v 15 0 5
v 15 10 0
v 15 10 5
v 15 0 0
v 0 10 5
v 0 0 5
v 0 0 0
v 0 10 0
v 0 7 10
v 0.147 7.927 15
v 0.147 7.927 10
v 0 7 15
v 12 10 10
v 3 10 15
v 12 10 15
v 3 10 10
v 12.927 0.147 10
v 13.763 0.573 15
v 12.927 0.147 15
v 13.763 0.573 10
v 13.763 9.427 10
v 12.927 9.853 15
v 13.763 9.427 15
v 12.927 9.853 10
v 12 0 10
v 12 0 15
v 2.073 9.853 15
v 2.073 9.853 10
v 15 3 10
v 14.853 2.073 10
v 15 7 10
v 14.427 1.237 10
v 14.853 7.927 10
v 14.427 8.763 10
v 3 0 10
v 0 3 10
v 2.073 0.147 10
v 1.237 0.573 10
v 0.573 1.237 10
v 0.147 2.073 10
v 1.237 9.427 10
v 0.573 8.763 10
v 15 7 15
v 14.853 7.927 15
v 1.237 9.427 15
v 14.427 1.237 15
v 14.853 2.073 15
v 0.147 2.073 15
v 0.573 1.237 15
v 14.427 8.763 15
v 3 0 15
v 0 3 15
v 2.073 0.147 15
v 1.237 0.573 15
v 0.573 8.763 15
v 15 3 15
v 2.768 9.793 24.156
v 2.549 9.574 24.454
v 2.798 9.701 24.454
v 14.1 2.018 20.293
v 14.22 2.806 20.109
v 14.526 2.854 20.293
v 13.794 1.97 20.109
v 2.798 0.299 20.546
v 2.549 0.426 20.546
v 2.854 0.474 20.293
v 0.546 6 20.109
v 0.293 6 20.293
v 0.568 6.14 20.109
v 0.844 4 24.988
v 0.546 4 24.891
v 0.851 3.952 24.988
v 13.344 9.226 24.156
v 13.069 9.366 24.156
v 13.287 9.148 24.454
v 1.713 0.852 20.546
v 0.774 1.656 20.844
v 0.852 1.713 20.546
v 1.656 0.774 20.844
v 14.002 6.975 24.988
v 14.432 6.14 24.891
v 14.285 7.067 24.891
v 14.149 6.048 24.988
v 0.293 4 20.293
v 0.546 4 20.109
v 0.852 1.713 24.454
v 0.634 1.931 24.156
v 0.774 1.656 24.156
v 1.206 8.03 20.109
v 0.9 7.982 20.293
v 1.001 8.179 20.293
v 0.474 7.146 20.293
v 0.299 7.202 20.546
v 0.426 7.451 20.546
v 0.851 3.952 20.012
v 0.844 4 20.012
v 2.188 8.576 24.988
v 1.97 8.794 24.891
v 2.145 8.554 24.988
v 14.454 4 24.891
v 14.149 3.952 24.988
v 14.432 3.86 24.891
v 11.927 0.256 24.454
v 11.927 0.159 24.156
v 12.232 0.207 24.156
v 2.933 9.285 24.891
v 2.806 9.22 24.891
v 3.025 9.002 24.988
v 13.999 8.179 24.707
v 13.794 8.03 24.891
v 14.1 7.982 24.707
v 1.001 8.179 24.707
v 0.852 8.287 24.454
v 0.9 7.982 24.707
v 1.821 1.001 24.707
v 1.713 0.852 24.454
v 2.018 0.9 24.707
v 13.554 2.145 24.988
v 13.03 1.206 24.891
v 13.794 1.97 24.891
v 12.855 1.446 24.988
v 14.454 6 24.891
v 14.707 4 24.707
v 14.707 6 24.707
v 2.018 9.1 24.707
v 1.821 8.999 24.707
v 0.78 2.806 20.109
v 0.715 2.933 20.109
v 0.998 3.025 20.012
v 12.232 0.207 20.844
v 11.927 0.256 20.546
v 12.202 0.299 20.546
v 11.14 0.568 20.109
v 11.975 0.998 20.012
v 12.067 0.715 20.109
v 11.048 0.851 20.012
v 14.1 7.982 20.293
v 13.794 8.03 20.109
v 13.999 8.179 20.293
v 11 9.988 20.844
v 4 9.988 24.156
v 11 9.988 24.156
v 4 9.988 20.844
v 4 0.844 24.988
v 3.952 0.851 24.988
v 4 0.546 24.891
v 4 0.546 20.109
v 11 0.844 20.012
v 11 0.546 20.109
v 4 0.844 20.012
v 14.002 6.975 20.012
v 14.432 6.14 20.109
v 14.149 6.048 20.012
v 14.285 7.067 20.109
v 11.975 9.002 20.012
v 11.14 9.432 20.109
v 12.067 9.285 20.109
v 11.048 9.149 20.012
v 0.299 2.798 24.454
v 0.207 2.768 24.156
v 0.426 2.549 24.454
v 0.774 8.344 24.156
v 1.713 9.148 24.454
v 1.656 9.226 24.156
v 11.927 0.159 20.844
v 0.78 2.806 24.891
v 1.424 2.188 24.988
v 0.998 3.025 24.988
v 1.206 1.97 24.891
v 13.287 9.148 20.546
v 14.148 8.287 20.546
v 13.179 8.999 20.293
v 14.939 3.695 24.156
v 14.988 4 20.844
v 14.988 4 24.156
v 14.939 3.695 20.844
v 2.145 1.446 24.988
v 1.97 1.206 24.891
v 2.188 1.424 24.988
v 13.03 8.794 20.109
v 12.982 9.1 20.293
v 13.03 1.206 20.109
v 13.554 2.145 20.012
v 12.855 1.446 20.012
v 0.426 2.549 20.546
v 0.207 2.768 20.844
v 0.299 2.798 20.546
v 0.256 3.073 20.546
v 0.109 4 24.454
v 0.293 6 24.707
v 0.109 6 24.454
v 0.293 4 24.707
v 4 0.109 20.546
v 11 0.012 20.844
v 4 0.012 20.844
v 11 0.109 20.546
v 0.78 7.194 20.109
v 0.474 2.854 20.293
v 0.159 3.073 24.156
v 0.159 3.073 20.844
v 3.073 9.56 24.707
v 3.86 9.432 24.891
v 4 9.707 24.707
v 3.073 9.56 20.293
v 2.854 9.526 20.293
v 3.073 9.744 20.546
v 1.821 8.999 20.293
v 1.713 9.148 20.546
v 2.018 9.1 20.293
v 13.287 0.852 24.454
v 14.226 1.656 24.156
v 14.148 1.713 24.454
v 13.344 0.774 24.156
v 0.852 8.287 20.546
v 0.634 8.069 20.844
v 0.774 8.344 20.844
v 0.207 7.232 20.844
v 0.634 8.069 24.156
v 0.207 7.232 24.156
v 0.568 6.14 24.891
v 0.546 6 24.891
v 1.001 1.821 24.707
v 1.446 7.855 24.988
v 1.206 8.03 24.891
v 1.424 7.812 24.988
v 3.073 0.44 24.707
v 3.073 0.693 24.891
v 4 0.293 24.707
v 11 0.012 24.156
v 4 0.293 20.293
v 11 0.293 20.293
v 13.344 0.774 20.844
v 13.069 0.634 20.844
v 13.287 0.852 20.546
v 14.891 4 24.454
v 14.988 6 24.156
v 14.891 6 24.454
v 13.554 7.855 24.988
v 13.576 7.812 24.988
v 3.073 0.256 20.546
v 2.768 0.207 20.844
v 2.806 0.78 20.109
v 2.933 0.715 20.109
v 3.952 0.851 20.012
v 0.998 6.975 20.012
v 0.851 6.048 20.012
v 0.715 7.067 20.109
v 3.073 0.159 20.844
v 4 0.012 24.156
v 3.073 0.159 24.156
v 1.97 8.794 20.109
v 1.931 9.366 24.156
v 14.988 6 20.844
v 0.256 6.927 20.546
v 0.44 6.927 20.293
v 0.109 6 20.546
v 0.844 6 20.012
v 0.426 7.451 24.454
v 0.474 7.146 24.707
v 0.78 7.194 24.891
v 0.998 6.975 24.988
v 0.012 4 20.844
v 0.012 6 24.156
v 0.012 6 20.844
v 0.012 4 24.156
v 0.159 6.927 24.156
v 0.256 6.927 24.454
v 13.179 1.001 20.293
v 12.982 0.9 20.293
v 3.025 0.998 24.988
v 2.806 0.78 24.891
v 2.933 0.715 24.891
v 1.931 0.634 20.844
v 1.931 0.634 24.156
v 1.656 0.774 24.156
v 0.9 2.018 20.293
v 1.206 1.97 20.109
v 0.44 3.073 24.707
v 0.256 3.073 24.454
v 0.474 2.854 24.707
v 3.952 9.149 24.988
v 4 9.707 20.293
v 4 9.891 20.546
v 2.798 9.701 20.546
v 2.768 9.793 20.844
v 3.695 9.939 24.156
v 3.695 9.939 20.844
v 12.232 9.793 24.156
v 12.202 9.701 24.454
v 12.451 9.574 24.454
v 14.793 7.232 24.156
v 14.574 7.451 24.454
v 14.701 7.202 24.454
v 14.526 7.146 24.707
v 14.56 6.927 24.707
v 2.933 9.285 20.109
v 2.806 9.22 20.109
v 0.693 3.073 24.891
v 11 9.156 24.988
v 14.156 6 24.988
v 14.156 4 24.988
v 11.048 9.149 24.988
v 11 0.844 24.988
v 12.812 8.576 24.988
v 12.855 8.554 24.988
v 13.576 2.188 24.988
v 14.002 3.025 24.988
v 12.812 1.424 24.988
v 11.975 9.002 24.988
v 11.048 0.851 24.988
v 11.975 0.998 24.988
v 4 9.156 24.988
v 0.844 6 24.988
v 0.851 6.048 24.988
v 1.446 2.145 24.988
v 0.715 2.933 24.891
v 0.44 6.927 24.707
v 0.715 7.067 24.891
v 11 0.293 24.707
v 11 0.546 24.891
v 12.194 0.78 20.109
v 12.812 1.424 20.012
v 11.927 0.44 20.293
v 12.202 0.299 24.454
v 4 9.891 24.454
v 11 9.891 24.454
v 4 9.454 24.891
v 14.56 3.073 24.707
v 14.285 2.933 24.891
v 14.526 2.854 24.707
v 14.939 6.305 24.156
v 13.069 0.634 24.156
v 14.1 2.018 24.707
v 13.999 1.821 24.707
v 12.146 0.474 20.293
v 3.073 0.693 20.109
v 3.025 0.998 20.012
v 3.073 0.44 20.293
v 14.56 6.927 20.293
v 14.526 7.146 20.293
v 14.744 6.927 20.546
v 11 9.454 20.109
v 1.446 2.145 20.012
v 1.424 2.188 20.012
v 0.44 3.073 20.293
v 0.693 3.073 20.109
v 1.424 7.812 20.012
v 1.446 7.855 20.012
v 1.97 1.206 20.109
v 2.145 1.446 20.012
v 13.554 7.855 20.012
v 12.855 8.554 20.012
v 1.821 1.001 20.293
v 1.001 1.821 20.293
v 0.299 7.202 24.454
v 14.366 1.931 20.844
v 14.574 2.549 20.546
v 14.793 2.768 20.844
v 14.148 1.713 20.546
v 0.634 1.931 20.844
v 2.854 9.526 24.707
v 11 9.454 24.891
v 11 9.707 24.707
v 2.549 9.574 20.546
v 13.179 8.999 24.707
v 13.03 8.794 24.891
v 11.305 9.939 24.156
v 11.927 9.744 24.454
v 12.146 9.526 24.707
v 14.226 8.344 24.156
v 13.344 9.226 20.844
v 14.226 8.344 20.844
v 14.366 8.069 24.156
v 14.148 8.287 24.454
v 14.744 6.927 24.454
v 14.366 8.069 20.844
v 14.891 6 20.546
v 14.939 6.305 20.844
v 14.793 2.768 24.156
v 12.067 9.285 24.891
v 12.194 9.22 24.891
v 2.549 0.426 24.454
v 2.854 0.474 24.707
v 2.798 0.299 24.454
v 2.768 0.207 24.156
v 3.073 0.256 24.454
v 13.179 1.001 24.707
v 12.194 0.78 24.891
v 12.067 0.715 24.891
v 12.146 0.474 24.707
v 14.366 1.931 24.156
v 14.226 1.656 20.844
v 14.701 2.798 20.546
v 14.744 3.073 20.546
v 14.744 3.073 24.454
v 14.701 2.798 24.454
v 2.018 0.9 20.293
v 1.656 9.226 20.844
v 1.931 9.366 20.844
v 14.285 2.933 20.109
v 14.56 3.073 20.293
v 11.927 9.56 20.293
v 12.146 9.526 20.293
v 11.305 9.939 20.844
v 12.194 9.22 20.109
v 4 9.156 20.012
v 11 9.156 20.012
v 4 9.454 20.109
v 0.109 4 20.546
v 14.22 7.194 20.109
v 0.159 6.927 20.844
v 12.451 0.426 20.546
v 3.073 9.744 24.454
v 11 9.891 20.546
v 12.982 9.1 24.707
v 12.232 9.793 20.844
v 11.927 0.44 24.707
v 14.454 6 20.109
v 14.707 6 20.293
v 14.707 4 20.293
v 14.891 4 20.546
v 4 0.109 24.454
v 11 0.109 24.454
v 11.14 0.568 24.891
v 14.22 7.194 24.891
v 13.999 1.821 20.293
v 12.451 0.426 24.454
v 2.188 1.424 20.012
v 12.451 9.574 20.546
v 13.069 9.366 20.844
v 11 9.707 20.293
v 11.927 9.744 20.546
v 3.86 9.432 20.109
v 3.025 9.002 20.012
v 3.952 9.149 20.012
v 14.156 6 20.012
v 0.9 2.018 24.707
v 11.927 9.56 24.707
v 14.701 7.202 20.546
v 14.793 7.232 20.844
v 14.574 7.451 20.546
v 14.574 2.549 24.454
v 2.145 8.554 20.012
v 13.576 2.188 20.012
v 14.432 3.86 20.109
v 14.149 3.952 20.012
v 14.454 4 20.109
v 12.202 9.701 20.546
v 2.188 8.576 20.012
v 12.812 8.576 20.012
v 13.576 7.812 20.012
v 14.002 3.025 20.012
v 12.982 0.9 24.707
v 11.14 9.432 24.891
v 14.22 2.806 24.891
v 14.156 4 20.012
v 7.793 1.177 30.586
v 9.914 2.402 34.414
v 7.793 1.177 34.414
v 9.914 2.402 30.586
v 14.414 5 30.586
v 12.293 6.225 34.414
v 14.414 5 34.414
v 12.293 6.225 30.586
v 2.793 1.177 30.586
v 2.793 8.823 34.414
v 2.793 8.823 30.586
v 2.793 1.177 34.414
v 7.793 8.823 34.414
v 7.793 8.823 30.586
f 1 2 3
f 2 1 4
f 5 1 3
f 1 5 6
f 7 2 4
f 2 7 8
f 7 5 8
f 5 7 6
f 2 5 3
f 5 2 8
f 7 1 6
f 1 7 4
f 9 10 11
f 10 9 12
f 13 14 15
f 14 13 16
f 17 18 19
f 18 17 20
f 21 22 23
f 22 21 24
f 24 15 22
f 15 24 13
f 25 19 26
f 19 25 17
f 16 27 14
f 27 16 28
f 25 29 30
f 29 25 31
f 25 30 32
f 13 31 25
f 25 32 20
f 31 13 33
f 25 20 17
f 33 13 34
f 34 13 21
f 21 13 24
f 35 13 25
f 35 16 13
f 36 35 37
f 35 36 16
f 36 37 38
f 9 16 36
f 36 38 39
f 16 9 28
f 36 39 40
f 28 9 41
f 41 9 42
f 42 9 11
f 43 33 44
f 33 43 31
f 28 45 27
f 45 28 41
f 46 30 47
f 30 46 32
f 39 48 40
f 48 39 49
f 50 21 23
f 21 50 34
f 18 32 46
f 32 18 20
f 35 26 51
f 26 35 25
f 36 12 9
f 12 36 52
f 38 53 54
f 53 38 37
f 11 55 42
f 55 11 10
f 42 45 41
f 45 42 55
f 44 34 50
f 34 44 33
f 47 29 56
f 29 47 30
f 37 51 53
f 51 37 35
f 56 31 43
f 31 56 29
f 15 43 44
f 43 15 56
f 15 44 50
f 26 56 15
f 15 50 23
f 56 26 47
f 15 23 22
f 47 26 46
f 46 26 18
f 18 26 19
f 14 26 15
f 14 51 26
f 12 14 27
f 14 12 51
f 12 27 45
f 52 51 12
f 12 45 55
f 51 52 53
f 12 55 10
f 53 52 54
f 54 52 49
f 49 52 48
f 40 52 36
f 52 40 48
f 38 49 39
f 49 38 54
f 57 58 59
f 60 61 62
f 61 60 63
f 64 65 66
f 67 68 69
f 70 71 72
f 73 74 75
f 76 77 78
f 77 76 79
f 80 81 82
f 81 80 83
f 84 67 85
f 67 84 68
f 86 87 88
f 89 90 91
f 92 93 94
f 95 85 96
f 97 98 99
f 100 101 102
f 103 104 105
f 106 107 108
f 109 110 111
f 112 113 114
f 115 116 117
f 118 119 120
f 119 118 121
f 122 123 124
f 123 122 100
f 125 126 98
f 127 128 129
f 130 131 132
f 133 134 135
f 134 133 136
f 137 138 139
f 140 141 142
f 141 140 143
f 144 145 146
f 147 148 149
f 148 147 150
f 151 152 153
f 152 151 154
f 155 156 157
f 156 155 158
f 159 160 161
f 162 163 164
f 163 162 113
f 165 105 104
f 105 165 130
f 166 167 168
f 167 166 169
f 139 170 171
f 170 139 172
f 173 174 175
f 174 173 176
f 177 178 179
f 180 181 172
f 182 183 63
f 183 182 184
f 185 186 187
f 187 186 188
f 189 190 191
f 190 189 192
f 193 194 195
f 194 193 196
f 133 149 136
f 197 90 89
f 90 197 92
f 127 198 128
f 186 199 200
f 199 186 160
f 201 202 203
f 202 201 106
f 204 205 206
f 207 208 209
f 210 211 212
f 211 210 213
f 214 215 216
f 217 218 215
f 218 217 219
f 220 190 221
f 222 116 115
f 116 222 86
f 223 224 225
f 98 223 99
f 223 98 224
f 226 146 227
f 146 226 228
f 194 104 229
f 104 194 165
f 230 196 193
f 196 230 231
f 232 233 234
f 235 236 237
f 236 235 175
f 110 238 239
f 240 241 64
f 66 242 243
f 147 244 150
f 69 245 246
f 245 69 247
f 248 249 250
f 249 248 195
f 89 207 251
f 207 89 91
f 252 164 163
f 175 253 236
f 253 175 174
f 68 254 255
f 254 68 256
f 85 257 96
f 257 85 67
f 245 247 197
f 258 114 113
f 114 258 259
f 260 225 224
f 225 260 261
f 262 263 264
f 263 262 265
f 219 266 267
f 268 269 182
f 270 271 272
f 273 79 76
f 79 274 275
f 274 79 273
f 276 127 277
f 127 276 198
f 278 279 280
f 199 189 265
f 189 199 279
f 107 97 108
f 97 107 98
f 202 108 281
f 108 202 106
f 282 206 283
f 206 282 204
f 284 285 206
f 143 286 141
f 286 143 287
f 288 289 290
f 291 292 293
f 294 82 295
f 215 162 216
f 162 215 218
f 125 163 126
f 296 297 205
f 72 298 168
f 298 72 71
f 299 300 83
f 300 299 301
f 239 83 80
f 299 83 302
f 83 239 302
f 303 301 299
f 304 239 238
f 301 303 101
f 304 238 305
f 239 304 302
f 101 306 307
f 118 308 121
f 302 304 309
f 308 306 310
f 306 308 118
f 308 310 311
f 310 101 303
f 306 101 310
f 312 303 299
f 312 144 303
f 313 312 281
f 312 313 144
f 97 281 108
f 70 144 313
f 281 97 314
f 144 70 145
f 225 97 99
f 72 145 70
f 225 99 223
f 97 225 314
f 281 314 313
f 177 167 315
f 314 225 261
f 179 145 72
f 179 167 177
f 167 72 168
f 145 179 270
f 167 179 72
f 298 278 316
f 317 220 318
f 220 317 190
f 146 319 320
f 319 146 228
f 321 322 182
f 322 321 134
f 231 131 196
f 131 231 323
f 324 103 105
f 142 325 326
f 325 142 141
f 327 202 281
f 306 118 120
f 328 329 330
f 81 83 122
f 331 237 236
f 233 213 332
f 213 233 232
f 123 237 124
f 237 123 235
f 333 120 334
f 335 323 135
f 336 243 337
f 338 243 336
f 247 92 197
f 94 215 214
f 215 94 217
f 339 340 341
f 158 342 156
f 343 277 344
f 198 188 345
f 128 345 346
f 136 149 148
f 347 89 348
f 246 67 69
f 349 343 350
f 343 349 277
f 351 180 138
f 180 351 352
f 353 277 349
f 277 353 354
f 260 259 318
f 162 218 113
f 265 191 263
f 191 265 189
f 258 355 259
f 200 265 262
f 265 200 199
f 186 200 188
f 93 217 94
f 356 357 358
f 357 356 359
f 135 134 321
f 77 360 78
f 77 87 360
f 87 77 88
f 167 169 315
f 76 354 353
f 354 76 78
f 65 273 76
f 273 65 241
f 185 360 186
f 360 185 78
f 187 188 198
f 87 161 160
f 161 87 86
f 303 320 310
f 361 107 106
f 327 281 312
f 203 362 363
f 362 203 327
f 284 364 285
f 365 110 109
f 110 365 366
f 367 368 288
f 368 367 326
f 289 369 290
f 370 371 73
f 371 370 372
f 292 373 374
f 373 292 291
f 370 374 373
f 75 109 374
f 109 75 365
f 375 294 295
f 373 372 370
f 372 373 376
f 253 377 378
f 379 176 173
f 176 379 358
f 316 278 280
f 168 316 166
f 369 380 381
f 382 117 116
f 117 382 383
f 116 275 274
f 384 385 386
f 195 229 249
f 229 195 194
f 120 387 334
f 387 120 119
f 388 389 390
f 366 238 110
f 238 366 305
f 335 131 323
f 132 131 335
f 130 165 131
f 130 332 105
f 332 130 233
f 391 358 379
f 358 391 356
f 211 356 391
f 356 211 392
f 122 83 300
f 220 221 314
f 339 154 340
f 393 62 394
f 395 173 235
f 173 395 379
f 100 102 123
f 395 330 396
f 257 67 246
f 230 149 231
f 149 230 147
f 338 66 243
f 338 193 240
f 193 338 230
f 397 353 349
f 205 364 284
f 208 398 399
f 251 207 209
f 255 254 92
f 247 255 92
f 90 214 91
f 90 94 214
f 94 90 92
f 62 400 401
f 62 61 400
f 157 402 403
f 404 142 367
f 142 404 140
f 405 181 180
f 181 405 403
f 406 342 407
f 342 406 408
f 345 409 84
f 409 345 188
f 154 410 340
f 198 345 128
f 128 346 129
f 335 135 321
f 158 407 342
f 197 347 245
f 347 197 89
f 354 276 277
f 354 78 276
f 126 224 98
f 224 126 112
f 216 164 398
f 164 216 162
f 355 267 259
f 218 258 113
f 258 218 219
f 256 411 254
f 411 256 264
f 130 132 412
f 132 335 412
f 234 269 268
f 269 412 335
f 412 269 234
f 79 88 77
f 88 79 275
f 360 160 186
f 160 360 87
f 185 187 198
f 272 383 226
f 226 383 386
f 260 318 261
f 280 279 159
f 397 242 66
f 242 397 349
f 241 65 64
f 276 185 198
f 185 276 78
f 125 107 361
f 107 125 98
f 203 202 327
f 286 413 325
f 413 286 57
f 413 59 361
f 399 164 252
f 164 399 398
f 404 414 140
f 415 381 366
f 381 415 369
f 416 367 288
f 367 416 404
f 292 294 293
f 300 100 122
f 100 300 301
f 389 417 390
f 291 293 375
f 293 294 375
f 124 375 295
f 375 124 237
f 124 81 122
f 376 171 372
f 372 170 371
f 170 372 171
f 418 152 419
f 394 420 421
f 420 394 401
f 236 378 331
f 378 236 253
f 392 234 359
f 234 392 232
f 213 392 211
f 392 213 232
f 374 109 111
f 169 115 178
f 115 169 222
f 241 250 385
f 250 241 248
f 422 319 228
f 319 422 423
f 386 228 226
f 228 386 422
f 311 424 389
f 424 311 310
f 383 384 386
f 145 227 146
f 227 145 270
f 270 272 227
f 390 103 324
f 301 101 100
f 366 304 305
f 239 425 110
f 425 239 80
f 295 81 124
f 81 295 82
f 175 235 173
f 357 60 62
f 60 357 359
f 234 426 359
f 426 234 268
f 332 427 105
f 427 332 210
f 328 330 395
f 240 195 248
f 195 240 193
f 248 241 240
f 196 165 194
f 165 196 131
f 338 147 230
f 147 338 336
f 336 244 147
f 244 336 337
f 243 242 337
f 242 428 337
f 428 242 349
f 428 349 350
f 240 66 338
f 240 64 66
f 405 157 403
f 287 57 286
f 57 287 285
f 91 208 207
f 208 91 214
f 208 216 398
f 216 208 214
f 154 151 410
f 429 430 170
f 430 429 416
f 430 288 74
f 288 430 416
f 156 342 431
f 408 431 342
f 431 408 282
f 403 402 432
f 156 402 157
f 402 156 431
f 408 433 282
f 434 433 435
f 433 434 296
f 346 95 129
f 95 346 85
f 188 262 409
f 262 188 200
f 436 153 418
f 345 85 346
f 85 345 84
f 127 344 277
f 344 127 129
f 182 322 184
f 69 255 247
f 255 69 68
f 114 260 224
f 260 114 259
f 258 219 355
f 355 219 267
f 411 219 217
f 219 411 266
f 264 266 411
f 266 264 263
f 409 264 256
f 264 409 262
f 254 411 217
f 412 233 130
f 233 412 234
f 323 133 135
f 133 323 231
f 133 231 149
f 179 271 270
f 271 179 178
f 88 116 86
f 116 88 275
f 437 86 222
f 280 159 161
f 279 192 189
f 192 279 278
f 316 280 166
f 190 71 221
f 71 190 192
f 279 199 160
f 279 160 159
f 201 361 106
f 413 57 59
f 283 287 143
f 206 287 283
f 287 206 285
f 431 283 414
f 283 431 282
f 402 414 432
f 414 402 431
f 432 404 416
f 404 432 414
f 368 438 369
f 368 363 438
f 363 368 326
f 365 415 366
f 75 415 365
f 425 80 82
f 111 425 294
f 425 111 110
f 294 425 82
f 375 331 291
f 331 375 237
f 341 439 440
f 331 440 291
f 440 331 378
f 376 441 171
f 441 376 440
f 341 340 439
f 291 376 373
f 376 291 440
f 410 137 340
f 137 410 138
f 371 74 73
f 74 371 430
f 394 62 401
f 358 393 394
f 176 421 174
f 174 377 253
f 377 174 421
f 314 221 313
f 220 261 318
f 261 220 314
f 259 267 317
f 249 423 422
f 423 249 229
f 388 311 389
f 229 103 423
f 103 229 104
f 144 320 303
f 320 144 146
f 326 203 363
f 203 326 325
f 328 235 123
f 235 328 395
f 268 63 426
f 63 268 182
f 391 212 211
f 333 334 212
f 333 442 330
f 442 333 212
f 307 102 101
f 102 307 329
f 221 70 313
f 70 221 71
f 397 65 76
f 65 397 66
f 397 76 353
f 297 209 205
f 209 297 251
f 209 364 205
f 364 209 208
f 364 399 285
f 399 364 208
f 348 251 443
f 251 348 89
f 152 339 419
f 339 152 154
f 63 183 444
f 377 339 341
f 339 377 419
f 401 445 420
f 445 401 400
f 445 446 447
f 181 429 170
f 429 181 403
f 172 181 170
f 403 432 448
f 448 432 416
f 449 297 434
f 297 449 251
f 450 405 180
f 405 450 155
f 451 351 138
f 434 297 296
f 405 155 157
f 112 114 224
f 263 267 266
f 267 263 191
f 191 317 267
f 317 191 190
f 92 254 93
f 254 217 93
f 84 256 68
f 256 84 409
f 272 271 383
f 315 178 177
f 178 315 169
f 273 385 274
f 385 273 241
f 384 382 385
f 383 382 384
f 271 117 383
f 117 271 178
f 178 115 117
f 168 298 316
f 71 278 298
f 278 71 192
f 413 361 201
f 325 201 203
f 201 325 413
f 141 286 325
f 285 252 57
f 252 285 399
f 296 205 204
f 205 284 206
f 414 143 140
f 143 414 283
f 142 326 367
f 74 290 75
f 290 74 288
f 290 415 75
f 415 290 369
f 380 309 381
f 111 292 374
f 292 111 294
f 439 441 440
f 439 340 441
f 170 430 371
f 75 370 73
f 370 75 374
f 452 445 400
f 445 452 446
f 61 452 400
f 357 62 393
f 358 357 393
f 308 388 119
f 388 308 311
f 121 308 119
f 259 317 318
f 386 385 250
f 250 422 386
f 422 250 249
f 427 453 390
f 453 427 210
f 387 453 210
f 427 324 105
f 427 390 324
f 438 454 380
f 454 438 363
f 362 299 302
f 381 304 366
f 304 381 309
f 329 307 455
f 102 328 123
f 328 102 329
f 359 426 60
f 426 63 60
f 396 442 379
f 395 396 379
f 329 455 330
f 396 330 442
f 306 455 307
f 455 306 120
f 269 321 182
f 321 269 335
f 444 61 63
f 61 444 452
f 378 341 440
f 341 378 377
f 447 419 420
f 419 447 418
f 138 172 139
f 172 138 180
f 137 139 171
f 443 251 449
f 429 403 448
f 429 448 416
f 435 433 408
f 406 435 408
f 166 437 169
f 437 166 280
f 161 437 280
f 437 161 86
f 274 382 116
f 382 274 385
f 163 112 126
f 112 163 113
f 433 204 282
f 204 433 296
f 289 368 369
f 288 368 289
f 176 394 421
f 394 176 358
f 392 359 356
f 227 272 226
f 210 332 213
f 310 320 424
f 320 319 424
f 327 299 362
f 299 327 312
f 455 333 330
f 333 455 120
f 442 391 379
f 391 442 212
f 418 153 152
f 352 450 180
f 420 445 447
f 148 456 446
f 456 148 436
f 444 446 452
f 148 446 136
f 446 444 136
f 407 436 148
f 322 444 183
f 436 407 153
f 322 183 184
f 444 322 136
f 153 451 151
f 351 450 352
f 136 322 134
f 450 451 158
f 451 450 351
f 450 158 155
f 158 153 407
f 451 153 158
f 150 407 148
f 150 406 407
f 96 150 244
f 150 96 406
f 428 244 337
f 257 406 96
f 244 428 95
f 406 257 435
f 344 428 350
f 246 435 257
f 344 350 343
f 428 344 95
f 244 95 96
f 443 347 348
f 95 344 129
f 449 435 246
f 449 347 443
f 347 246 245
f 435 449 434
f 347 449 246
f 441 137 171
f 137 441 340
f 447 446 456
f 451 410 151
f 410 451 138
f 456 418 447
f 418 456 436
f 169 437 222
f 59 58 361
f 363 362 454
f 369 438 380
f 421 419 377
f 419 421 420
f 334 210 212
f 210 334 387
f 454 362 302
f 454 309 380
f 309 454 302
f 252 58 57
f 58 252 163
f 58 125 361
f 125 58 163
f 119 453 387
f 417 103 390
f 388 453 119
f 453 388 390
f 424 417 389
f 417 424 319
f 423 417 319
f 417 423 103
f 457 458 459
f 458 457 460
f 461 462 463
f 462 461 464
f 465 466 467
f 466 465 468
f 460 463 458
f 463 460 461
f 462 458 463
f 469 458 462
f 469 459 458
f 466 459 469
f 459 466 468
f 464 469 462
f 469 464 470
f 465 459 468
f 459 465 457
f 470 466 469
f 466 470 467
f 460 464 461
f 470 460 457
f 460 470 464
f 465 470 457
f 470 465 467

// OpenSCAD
include <BOSL2/std.scad>
include <BOSL2/hinges.scad>
include <../utils/box.scad>
use <davel/davel.scad>

$fn=96;
module roundcube(inner_x=90, inner_y=60, inner_z=30, wall=3) {
    hull() {
        translate([wall, wall, wall]) sphere(wall); 
        translate([inner_x+wall, wall, wall]) sphere(wall); 
        translate([wall, inner_y+wall, wall]) sphere(wall); 
        translate([inner_x+wall, inner_y+wall, wall]) sphere(wall); 
        translate([wall, wall, inner_z+wall]) sphere(wall); 
        translate([inner_x+wall, wall, inner_z+wall]) sphere(wall); 
        translate([wall, inner_y+wall, inner_z+wall]) sphere(wall); 
        translate([inner_x+wall, inner_y+wall, inner_z+wall]) sphere(wall); 
    }
}

module halfbox(inner_x=90, inner_y=60,  inner_z=30, wall=3) {
    difference() {
        roundcube(inner_x, inner_y, inner_z, wall);
        translate([0, 0, inner_z+wall]) cube([inner_x+2*wall, inner_y+2*wall, wall]);
        translate([wall, wall, wall]) cube([inner_x, inner_y, inner_z+1]);
    }
}

module tbevel(lx, ry, rz) {
    rotate([0, 0, 180])
    translate([-lx/2, 0, 0])
    rotate([0, 90, 0])
    linear_extrude(lx)
    polygon([
        [0, 0],
        [rz, 0],
        [0, ry]
    ]);
}


module mitered_bevel_butress(x, y, ry, rz, cr=0, cro=[0, 0, 0]) { // x, y are inner
    // bottom
    translate([0, -y/2, 0]) rotate([0, 0, 0])  tbevel(x, ry, rz);
    // top
    translate([0, y/2, 0]) rotate([0, 0, 180]) tbevel(x, ry, rz);
    // left
    translate([-x/2, 0, 0]) rotate([0, 0, 270]) tbevel(y, ry, rz);
    // right
    translate([x/2, 0, 0]) rotate([0, 0, 90]) tbevel(y, ry, rz);

    // bl
    translate([-x/2, -y/2, 0])
        intersection() {
            rotate([0, 0, 0]) tbevel(2*ry, ry, rz);
            rotate([0, 0, 270]) tbevel(2*ry, ry, rz);
            if(cr > 0) {
                translate([-cro[0], -cro[1], 0]) 
                rotate([0, 0, 90])
                union() {
                    translate([0, 0, -rz]) cylinder(h=rz, r=cr);
                    translate([0, 0, -rz]) cube([cr, cr, rz]);
                    translate([-cr, -cr, -rz]) cube([cr, cr, rz]);
                }
            }
        }
    //br
    translate([x/2, -y/2, 0])
        intersection() {
            rotate([0, 0, 0]) tbevel(2*ry, ry, rz);
            rotate([0, 0, 90]) tbevel(2*ry, ry, rz);
            if(cr > 0) {
                translate([cro[0], -cro[1], 0]) 
                union() {
                    translate([0, 0, -rz]) cylinder(h=rz, r=cr);
                    translate([0, 0, -rz]) cube([cr, cr, rz]);
                    translate([-cr, -cr, -rz]) cube([cr, cr, rz]);
                }
            }
        }
    // tl
    translate([-x/2, y/2, 0])
        intersection() {
            rotate([0, 0, 180]) tbevel(2*ry, ry, rz);
            rotate([0, 0, 270]) tbevel(2*ry, ry, rz);
            if(cr > 0) {
                translate([-cro[0], cro[1], 0]) 
                union() {
                    translate([0, 0, -rz]) cylinder(h=rz, r=cr);
                    translate([0, 0, -rz]) cube([cr, cr, rz]);
                    translate([-cr, -cr, -rz]) cube([cr, cr, rz]);
                }
            }
        }
    //tr
    translate([x/2, y/2, 0])
        intersection() {
            rotate([0, 0, 180]) tbevel(2*ry, ry, rz);
            rotate([0, 0, 90]) tbevel(2*ry, ry, rz);
            if(cr > 0) {
                translate([cro[0], cro[1], 0]) 
                rotate([0, 0, 90])
                union() {
                    translate([0, 0, -rz]) cylinder(h=rz, r=cr);
                    translate([0, 0, -rz]) cube([cr, cr, rz]);
                    translate([-cr, -cr, -rz]) cube([cr, cr, rz]);
                }
            }
        }
}

module mitered_buttress(x, y, r) { // x, y are inner
    // bottom
    translate([0, -y/2, 0]) davel_buttress(x, [0, -1, 0], [0, 0, -1], r);
    // top
    translate([0, y/2, 0]) davel_buttress(x, [0, 1, 0], [0, 0, -1], r);
    // left
    translate([-x/2, 0, 0]) davel_buttress(y, [-1, 0, 0], [0, 0, -1], r);
    // right
    translate([x/2, 0, 0]) davel_buttress(y, [1, 0, 0], [0, 0, -1], r);

    // bl
    translate([-x/2, -y/2, 0])
        intersection() {
            davel_buttress(2*r, [0, -1, 0], [0, 0, -1], r);
            davel_buttress(2*r, [-1, 0, 0], [0, 0, -1], r);
        }
    //br
    translate([x/2, -y/2, 0])
        intersection() {
            davel_buttress(2*r, [0, -1, 0], [0, 0, -1], r);
            davel_buttress(2*r, [1, 0, 0], [0, 0, -1], r);
        }
    // tl
    translate([-x/2, y/2, 0])
        intersection() {
            davel_buttress(2*r, [0, 1, 0], [0, 0, -1], r);
            davel_buttress(2*r, [-1, 0, 0], [0, 0, -1], r);
        }
    //tr
    translate([x/2, y/2, 0])
        intersection() {
            davel_buttress(2*r, [0, 1, 0], [0, 0, -1], r);
            davel_buttress(2*r, [1, 0, 0], [0, 0, -1], r);
        }
}



module box2(inner_x=90, inner_y=60, inner_z_base=40, inner_z_lid=5, wall=3, screw_diam=3, sp_z=15, screwposts=true, separate=false) {
    union() {
        halfbox(inner_x, inner_y, inner_z_base, wall);
        if (screwposts) {
            sp_diam=screw_diam+2*wall;
            sp_oh = screw_diam+wall; //overhang
            wr = sqrt(wall^2/2);

            translate([inner_x/2+wall, inner_y/2+wall, inner_z_base+wall-sp_z])
                mitered_bevel_butress(inner_x+2*wr, inner_y+2*wr, sp_oh+(wall-wr), 15, cr=screw_diam/2+wall, cro=[wall/2+(wall-wr), wall/2+(wall-wr), 0]);
            translate([wall, -sp_oh, inner_z_base+wall-sp_z])
                cube([inner_x, sp_oh, sp_z ]);
            translate([-sp_oh, wall, inner_z_base+wall-sp_z])
                cube([sp_oh, inner_y, sp_z ]);
            translate([wall, inner_y+2*wall, inner_z_base+wall-sp_z])
                cube([inner_x, sp_oh, sp_z ]);
            translate([inner_x+2*wall, wall, inner_z_base+wall-sp_z])
                cube([sp_oh, inner_y, sp_z ]);

            translate([-sp_oh, -sp_oh, inner_z_base+wall-sp_z])
                screwpost(sp_z, screw_diam, sp_diam, centre=false, rot=0,   square=[false, true, true, true]);
            translate([inner_x+1*wall, -sp_oh, inner_z_base+wall-sp_z])
                screwpost(sp_z, screw_diam, sp_diam, centre=false, rot=90,  square=[false, true, true, true]);
            translate([-sp_oh, inner_y+1*wall, inner_z_base+wall-sp_z])
                screwpost(sp_z, screw_diam, sp_diam, centre=false, rot=270, square=[false, true, true, true]);
            translate([inner_x+1*wall, inner_y+1*wall, inner_z_base+wall-sp_z])
                screwpost(sp_z, screw_diam, sp_diam, centre=false, rot=180, square=[false, true, true, true]);
        }
    }

}



module hexcyl(d=10, h=10) {
    // envision the triangle between the centre of a hexagon and its "point"
    // θ=30, adj=r, hyp=x; c=a/h; hyp=adj/cos(30)
    r=d/2;
    crad = r/cos(30);
    cylinder(r=crad, h=h, $fn=6);
}

module pg7_cutout(rot=[0, 90, 0], nut_depth=1.6, wall_depth=4, depth=7) {
    rotate(rot)
        rotate([0, 0, 60])
        hexcyl(d=17.5, h=nut_depth);
    rotate(rot)
        cylinder(d=13.5, h=depth+2*eps, $fn=100);
    rotate(rot)
        translate([0, 0, wall_depth])
        cylinder(d=22, h=depth+2*eps, $fn=100);
}


module pg7() {
    translate([-6.7,0, 0])
    color("#222222")
    import("3d/pg/pg7.stl");
}
